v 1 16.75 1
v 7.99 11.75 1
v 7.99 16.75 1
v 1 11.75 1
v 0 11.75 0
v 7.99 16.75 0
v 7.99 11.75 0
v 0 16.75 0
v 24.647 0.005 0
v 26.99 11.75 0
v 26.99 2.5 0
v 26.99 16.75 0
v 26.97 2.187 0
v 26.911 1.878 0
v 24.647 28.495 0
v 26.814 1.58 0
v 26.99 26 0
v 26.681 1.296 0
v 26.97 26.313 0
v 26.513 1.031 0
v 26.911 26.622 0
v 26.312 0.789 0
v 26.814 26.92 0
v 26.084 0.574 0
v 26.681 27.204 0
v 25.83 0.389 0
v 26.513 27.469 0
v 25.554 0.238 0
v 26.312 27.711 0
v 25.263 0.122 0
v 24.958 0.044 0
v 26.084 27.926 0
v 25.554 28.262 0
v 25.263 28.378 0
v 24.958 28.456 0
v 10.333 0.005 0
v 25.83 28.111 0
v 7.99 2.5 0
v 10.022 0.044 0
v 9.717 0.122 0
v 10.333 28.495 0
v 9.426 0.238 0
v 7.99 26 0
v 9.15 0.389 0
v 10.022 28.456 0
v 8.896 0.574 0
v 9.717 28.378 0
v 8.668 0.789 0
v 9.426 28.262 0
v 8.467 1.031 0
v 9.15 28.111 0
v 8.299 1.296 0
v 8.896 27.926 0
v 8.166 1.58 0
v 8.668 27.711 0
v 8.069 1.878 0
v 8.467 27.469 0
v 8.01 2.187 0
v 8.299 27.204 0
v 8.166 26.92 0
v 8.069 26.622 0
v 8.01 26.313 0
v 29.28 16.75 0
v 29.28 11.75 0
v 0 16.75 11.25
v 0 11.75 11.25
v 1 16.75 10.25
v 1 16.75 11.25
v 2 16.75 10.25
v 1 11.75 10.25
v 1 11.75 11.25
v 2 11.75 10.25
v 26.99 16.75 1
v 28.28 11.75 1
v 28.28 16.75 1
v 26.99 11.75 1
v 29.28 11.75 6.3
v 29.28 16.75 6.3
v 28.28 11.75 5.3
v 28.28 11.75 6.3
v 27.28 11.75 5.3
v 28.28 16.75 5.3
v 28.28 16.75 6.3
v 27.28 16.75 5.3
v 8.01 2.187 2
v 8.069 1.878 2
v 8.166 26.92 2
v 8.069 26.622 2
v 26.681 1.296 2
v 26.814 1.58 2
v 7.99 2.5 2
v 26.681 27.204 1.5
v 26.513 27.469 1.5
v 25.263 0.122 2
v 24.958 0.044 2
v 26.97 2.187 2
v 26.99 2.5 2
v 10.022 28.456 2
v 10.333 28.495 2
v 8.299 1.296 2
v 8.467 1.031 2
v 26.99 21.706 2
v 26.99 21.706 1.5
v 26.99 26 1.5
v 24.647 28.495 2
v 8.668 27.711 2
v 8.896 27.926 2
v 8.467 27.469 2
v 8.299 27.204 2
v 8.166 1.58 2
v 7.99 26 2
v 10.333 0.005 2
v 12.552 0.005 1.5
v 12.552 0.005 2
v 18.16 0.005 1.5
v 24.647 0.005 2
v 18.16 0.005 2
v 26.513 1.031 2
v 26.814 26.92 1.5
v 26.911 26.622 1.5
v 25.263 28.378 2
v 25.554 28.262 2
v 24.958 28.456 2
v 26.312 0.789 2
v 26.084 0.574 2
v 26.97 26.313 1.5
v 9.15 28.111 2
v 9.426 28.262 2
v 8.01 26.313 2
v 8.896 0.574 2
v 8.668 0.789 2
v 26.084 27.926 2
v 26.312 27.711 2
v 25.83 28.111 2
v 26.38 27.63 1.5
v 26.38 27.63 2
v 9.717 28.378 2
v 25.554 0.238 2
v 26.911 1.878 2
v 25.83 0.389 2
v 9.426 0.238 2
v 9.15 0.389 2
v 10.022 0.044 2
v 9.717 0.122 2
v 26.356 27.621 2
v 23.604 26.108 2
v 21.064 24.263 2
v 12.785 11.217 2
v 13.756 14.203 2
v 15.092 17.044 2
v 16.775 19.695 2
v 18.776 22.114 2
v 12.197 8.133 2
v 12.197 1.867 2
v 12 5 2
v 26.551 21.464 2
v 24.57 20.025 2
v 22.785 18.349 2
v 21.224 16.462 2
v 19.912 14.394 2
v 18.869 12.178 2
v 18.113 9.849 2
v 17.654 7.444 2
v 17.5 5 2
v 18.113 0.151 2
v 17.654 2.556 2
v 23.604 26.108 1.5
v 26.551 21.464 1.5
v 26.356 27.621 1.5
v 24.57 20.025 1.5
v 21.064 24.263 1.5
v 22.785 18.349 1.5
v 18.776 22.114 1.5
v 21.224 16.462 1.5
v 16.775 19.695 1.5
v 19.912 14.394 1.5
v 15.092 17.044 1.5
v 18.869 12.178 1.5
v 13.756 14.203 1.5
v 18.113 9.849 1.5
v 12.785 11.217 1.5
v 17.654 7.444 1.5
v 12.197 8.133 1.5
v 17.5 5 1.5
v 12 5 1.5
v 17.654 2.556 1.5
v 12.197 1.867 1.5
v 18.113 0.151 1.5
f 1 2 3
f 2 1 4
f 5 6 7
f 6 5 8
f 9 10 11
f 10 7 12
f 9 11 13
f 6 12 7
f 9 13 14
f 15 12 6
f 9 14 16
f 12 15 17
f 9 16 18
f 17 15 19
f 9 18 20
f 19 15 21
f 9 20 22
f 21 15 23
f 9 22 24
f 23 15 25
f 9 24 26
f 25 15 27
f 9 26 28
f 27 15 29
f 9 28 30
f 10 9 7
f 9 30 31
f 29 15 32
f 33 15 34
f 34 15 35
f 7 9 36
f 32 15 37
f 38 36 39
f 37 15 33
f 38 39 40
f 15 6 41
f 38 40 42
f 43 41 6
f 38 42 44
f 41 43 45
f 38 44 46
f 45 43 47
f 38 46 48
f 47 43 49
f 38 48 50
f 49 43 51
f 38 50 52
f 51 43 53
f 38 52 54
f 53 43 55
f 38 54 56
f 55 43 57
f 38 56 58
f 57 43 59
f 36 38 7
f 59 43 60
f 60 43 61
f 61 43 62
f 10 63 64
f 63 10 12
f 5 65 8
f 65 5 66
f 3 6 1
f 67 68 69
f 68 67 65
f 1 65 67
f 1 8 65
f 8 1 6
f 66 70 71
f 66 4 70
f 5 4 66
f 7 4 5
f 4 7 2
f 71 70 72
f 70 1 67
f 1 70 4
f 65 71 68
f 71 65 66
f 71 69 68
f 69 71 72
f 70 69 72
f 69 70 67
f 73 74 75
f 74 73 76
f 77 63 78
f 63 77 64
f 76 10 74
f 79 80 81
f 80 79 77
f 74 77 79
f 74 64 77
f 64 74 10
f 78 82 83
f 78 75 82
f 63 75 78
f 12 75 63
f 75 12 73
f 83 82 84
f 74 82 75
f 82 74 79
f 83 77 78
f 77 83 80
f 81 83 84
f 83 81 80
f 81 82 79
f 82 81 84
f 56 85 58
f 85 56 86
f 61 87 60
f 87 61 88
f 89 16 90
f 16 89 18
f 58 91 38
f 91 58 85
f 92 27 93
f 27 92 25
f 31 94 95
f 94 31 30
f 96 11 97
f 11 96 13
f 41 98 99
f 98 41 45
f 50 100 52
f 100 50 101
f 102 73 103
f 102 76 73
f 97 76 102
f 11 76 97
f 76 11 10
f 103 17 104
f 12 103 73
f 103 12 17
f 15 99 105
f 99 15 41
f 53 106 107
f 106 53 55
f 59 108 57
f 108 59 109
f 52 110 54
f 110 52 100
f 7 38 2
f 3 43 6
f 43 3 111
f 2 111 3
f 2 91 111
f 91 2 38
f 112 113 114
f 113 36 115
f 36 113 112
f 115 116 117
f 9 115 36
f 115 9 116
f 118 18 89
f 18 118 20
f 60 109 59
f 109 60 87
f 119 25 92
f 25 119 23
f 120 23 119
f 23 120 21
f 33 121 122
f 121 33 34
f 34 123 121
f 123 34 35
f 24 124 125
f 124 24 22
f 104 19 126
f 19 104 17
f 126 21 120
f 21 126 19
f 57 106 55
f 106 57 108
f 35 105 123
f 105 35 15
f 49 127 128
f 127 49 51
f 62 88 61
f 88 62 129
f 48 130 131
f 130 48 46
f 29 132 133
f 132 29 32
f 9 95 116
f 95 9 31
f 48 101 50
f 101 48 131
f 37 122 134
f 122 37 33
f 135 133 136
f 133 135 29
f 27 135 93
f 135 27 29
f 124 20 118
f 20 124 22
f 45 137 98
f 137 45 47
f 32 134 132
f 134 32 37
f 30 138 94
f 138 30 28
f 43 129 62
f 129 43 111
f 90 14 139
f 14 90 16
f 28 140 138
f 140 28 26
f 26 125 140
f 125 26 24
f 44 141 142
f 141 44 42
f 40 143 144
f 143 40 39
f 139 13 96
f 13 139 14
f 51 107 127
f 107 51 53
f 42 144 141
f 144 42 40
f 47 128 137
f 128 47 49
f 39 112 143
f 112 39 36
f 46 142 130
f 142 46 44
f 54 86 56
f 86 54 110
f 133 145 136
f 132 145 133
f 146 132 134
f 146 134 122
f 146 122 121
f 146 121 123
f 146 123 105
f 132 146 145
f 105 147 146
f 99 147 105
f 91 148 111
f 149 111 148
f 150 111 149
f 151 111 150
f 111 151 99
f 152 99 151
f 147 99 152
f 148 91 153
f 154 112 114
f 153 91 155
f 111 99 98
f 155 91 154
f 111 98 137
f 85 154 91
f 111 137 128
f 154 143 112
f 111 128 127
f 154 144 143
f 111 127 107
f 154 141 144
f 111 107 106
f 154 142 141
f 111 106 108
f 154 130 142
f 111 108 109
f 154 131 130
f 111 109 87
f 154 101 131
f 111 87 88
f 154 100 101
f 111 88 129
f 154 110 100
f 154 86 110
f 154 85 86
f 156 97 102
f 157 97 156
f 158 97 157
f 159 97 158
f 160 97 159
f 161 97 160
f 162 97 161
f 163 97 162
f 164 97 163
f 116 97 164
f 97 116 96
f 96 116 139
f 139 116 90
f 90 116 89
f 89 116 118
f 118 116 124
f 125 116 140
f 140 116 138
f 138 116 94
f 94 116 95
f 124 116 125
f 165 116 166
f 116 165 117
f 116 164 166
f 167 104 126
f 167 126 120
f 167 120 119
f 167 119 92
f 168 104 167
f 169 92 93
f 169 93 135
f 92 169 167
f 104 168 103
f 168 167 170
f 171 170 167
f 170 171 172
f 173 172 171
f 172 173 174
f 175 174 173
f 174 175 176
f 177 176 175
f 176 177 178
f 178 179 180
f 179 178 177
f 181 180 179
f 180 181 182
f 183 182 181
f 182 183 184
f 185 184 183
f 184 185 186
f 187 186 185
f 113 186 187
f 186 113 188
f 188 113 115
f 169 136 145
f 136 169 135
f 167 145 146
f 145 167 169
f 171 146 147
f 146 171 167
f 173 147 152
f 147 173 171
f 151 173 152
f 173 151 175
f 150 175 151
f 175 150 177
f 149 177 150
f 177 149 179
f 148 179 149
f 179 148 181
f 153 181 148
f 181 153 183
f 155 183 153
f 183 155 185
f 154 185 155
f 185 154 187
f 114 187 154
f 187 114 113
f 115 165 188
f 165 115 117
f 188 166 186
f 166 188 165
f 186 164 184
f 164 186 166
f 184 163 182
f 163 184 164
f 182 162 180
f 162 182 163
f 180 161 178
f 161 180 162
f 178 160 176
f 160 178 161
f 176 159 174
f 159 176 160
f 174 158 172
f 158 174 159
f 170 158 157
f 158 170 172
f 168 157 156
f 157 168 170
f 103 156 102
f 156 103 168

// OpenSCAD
/* Original Numbers, Clips too small, to tight
$fn=50;
BASEH = 2;
CORNERR = 2.5;
SHORTL = 14;
LONGL = 23.5;
TCLIPW = 5;
TCLIPL = 8;
TCLIPTH = 9.25;
TCLIPH = 1;

SCLIPW = 5;
SCLIPL = 2.3;
SCLIPTH = 4.3;
SCLIPH = 1;

RINGI = 19.5;
RINGO = 25;
*/

$fn=50;
BASEH = 2;
CORNERR = 2.5;
SHORTL = 14;
LONGL = 23.5;
TCLIPW = 5;
TCLIPL = 8;
TCLIPTH = 9.25;
TCLIPH = 1;

SCLIPW = 5;
SCLIPL = 2.3;
SCLIPTH = 4.3;
SCLIPH = 1;

RINGI = 19.5;
RINGO = 25;

module base() {
  linear_extrude(BASEH) {
    hull() {
      translate([CORNERR,CORNERR,0]) circle(r=CORNERR);
      translate([CORNERR+SHORTL, CORNERR,0]) circle(r=CORNERR);
      translate([CORNERR+SHORTL, CORNERR+LONGL,0]) circle(r=CORNERR);
      translate([CORNERR, CORNERR+LONGL,0]) circle(r=CORNERR);
    }  
  }
}

module cliptall() {
  cube([TCLIPL,TCLIPW,TCLIPH]); 
  cube([TCLIPH,TCLIPW,TCLIPH+TCLIPTH+TCLIPH]);
  translate([1,0,TCLIPTH+TCLIPH+TCLIPH])
    rotate([-90,0,0])
      linear_extrude(TCLIPW) 
        polygon(points=[[0,0], [0,1], [1,1]]);
}

module clipshort() {
  rotate([0,0,180])
  translate([-SCLIPL,-SCLIPW,0]) {
  cube([SCLIPL,SCLIPW,SCLIPH]); 
  cube([SCLIPH,SCLIPW,SCLIPH+SCLIPTH+SCLIPH]);
  translate([1,0,SCLIPTH+SCLIPH+SCLIPH])
    rotate([-90,0,0])
      linear_extrude(SCLIPW) 
        polygon(points=[[0,0], [0,1], [1,1]]);
  }
}

module ring() {
    linear_extrude(1.01) 
    difference() {
        circle(r=RINGO);
        circle(r=RINGI);
    }
}

// Build it
module clip() {
  translate([TCLIPL-0.01,0,0]) base();
  translate([0,LONGL/2,0]) cliptall();
  translate([TCLIPL+SHORTL+CORNERR*2-0.02,LONGL/2.0,0]) clipshort();
}

// Put the Clip and Ring together
difference() {
    clip();
    translate([37,5,1.5]) ring();
}
